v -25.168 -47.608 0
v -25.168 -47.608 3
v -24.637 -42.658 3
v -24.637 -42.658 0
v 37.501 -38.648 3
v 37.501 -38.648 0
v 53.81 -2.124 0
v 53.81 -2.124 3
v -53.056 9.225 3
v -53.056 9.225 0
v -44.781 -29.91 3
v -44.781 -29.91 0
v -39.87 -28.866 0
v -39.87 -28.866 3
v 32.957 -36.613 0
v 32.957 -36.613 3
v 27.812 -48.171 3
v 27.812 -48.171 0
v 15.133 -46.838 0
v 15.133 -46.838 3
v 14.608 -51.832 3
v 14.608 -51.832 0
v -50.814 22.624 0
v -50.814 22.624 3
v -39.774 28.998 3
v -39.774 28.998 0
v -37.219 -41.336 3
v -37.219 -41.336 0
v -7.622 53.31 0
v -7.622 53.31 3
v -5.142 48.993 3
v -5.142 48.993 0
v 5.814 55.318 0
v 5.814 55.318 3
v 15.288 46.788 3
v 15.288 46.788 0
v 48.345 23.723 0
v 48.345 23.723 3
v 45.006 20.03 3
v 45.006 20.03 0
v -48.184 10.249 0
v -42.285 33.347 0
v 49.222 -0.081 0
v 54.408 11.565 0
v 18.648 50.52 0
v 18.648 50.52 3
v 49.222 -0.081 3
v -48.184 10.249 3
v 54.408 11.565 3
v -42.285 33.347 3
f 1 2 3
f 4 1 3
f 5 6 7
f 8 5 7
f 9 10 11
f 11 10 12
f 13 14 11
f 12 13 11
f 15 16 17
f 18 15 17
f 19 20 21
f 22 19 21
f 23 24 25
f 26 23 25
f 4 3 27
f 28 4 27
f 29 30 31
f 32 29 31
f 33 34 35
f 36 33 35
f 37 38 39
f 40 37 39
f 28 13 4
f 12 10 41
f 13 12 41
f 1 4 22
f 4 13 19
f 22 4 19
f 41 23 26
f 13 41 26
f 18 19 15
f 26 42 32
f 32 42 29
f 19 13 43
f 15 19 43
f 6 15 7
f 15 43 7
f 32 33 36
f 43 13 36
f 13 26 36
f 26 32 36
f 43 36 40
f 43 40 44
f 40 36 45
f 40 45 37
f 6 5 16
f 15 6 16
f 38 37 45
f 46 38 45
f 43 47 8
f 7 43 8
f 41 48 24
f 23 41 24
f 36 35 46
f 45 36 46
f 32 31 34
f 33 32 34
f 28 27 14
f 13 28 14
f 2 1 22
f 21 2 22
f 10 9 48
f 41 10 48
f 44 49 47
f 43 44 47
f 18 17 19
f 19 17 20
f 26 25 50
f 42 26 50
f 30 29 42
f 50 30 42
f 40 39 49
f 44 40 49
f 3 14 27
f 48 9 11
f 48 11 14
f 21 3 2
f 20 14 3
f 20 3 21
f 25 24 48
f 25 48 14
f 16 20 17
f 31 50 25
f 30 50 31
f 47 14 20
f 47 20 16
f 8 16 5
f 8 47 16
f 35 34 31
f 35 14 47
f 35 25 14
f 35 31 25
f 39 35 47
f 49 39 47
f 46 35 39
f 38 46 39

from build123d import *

# Parameters (mm, degrees)
BOSS_EXTRUDE1_DEPTH = 3
CUT_EXTRUDE3_DEPTH  = 10


with BuildPart() as part:
    # Sketch1 → Boss-Extrude1 (new body)
    with BuildSketch(Plane.XY):
        Polygon((-41.404007678, -45.884292091), (30.844012981, -53.556577334), (60.46665605, 12.784506978), (6.526435644, 61.457837175), (-56.433096997, 25.198525272), align=None)
    extrude(amount=BOSS_EXTRUDE1_DEPTH)

    # Sketch4 → Cut-Extrude3 (cut)
    with BuildSketch(Plane.XY.offset(3)):
        Polygon((-50.814192878, 22.62393629), (-39.77384321, 28.998085143), (-42.284603166, 33.346848953), (-56.433096997, 25.198525272), (-53.055705701, 9.224537525), (-48.18384365, 10.249116114), align=None)
        Polygon((5.814192878, 55.31835005), (15.288024352, 46.788073876), (18.648077016, 50.519790415), (6.526435644, 61.457837175), (-7.622058187, 53.309513494), (-5.142137875, 48.99270954), align=None)
        Polygon((54.407561694, 11.564684243), (49.22236188, -0.08146522), (53.809748587, -2.123901372), (60.46665605, 12.784506978), (48.345014677, 23.722553738), (45.005827668, 20.030043583), align=None)
        Polygon((37.500920444, -38.648168984), (32.957269066, -36.61346181), (27.811529494, -48.170982119), (15.133068296, -46.838422151), (14.608176536, -51.832433652), (30.844012981, -53.556577334), align=None)
        Polygon((-25.168171234, -47.608435773), (-24.637115209, -42.658407427), (-37.219091188, -41.335988464), (-39.869611319, -28.866271649), (-44.781398973, -29.910304344), (-41.404007678, -45.884292091), align=None)
    extrude(amount=-CUT_EXTRUDE3_DEPTH, mode=Mode.SUBTRACT)


solid = part.part
